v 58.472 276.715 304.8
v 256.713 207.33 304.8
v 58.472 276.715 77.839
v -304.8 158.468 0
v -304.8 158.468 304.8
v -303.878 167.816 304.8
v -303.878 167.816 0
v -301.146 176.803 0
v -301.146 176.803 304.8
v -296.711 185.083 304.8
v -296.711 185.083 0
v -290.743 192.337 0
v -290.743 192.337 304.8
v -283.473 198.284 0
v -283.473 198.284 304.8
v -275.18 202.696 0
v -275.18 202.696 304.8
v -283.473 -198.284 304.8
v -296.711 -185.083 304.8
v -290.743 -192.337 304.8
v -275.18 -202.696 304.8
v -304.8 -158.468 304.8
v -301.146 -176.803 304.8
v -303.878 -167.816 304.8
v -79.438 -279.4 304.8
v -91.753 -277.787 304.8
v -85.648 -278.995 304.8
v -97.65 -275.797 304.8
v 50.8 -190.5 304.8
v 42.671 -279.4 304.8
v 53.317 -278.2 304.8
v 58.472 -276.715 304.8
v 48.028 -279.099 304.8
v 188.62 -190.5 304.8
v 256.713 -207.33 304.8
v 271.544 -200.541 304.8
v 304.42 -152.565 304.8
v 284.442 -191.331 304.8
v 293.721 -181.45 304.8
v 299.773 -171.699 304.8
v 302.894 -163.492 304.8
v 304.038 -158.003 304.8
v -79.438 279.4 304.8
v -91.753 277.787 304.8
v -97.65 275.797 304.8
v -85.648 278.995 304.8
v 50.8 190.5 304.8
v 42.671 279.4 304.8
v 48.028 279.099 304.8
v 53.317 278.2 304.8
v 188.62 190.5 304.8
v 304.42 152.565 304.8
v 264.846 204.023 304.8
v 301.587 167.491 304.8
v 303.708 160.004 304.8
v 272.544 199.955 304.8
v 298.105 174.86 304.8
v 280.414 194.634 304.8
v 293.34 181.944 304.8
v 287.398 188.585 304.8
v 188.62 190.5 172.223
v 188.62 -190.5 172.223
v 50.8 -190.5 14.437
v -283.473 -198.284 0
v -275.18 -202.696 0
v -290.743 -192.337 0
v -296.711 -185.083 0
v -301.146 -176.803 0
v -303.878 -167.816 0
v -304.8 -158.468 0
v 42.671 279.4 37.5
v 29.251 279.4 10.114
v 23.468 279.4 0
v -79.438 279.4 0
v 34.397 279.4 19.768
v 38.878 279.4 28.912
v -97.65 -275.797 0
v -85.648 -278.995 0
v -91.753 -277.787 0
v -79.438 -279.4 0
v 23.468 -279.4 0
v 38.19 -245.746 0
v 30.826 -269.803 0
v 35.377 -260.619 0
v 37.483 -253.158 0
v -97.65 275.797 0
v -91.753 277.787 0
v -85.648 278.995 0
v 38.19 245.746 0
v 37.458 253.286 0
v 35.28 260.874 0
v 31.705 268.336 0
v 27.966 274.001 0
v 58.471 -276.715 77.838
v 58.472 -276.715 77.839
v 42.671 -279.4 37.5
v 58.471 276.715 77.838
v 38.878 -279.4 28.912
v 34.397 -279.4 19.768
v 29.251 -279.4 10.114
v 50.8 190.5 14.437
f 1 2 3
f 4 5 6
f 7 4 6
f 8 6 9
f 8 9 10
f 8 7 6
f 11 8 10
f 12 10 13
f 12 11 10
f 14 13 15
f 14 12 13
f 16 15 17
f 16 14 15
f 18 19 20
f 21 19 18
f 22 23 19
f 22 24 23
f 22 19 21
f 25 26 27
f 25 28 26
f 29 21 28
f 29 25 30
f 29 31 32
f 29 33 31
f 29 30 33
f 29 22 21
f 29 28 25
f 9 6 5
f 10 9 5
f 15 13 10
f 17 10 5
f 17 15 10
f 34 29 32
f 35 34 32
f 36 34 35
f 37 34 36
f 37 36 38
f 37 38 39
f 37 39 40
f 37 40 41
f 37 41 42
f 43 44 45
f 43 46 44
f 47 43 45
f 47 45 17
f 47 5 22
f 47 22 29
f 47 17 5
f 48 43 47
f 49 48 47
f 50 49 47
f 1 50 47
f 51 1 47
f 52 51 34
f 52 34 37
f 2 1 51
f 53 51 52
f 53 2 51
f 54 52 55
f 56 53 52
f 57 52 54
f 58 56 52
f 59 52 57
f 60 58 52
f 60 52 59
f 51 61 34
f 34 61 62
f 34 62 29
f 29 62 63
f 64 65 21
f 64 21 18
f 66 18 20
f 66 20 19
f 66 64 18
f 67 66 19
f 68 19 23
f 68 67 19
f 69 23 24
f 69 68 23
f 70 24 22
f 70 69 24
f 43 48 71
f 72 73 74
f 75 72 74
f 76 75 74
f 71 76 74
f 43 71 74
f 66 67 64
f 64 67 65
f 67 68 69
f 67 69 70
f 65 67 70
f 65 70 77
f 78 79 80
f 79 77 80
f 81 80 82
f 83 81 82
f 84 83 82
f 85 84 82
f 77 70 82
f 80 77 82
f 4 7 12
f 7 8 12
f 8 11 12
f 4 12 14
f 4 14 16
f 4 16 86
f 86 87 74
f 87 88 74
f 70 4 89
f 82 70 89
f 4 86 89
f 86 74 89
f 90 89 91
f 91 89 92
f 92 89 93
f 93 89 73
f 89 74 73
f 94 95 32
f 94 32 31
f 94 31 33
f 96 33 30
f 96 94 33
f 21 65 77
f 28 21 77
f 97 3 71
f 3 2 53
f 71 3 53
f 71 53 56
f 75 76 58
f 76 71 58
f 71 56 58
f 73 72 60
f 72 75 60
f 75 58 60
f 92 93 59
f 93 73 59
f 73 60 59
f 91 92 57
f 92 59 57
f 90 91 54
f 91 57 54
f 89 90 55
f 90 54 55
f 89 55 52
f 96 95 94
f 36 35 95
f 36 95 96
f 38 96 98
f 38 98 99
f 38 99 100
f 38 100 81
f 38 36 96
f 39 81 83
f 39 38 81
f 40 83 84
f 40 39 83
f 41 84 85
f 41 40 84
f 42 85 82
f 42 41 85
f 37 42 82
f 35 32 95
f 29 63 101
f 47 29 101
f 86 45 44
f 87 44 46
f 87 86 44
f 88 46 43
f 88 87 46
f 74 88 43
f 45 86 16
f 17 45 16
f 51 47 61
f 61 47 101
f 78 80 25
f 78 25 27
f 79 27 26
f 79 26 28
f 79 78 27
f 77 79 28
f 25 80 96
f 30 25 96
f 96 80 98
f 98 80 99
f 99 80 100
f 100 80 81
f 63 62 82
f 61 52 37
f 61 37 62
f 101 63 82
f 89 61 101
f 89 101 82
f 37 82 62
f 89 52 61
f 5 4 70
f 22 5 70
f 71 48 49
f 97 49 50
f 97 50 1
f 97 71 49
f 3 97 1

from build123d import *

# Parameters (mm, degrees)
F0_W        = 116.1797607577
F0_H        = 190.5
F1_DEPTH    = 304.8
F3_DEPTH    = 401.32
F4_DEPTH    = 942.34
F5_T1_DEPTH = 331.0069513468
F5_T3_DEPTH = 352.1111565483
F5_T5_DEPTH = 464.9612906349
F5_T7_DEPTH = 766.5905156751
F5_T9_DEPTH = 766.5905156751


# Not quite as in the source:
# - a fillet or chamfer that OpenCascade refuses, or shapes differently, is made with other operations: its cross-section is extruded or revolved along the edge and cut away or added


with BuildPart() as f1:
    # F0 (on Top) → F1 (new body)
    with BuildSketch(Plane.XY):
        Polygon((50.8, 190.5), (50.8, 279.4), (-88.9, 279.4), (-88.9, 190.5), (-88.9, 0), (0, 0), (50.8, 0), align=None)
        Polygon((188.6202392423, 231.1629162652), (50.8, 279.4), (50.8, 190.5), (188.6202392423, 190.5), align=None)
        Polygon((-88.9, 190.5), (-88.9, 279.4), (-304.8, 190.5), (-304.8, 0), (-188.6202392423, 0), (-88.9, 0), align=None)
        Polygon((304.8, 190.5), (188.6202392423, 231.1629162652), (188.6202392423, 190.5), align=None)
        with Locations((246.7101196212, 95.25)):
            Rectangle(F0_W, F0_H)
        Polygon((50.8, -190.5), (50.8, 0), (0, 0), (-88.9, 0), (-88.9, -190.5), (-88.9, -279.4), (50.8, -279.4), align=None)
        Polygon((-88.9, -190.5), (-88.9, 0), (-188.6202392423, 0), (-304.8, 0), (-304.8, -190.5), (-88.9, -279.4), align=None)
        with Locations((246.7101196212, -95.25)):
            Rectangle(F0_W, F0_H)
        Polygon((188.6202392423, -190.5), (50.8, -190.5), (50.8, -279.4), (188.6202392423, -231.1629162652), align=None)
        Polygon((304.8, -190.5), (188.6202392423, -190.5), (188.6202392423, -231.1629162652), align=None)
    extrude(amount=F1_DEPTH)

    # F2 (on Front) → F3 (cut)
    with BuildSketch(Plane.XZ):
        Polygon((306.468307972, 307.1446120739), (38.1901785731, 0), (-147.3951488733, -79.8071026802), (42.6088683307, 0), (5.996810738, -19.8390558362), (306.468307972, -19.8390558362), align=None)
    extrude(amount=-F3_DEPTH, mode=Mode.SUBTRACT)

    # F2 (on Front) → F4 (cut)
    with BuildSketch(Plane.XZ):
        Polygon((306.468307972, 307.1446120739), (38.1901785731, 0), (-147.3951488733, -79.8071026802), (42.6088683307, 0), (5.996810738, -19.8390558362), (306.468307972, -19.8390558362), align=None)
    extrude(amount=F4_DEPTH, mode=Mode.SUBTRACT)

    # F5: fillet of radius 47.8312768991 on 8 edges, made by hand

    # F5_s2 → F5_t1 (cut)
    with BuildSketch(Plane.XY.offset(-5.8851483368)):
        with BuildLine():
            ThreePointArc((42.671278796, 279.4), (50.6850979696, 278.7238898597), (58.4723614349, 276.7146734978))
            Line((58.4723614349, 276.7146734978), (50.8, 279.4))
            Line((50.8, 279.4), (42.671278796, 279.4))
        make_face()
        with BuildLine():
            ThreePointArc((58.4723614349, -276.7146734978), (50.6850979696, -278.7238898597), (42.671278796, -279.4))
            Line((42.671278796, -279.4), (50.8, -279.4))
            Line((50.8, -279.4), (58.4723614349, -276.7146734978))
        make_face()
    extrude(amount=F5_T1_DEPTH, mode=Mode.SUBTRACT)

    # F5_s4 → F5_t3 (cut)
    with BuildSketch(Plane.XY.offset(-23.6555782741)):
        with BuildLine():
            ThreePointArc((-97.6495180547, 275.7972572716), (-88.7201117415, 278.4906706018), (-79.4377686903, 279.4))
            Line((-79.4377686903, 279.4), (-88.9, 279.4))
            Line((-88.9, 279.4), (-97.6495180547, 275.7972572716))
        make_face()
        with BuildLine():
            ThreePointArc((-79.4377686903, -279.4), (-88.7201117415, -278.4906706018), (-97.6495180547, -275.7972572716))
            Line((-97.6495180547, -275.7972572716), (-88.9, -279.4))
            Line((-88.9, -279.4), (-79.4377686903, -279.4))
        make_face()
    extrude(amount=F5_T3_DEPTH, mode=Mode.SUBTRACT)

    # F5_s6 → F5_t5 (cut)
    with BuildSketch(Plane.XY.offset(-80.0806453175)):
        with BuildLine():
            ThreePointArc((-304.8, 158.467741873), (-296.7111580821, 185.0829614206), (-275.1804724653, 202.6962760437))
            Line((-275.1804724653, 202.6962760437), (-304.8, 190.5))
            Line((-304.8, 190.5), (-304.8, 158.467741873))
        make_face()
        with BuildLine():
            ThreePointArc((-275.1804724653, -202.6962760437), (-296.7111580821, -185.0829614206), (-304.8, -158.467741873))
            Line((-304.8, -158.467741873), (-304.8, -190.5))
            Line((-304.8, -190.5), (-275.1804724653, -202.6962760437))
        make_face()
    extrude(amount=F5_T5_DEPTH, mode=Mode.SUBTRACT)

    # F5_s8 → F5_t7 (cut)
    with BuildSketch(Plane(origin=(300.5564502803, -105.1947575981, 344.0992172359), x_dir=(-0.3303504247, -0.9438583564, 0), z_dir=(-0.6410735721, 0.2243757502, -0.7339483619))):
        with BuildLine():
            ThreePointArc((-280.4958263449, 79.454688834), (-270.4603992444, 50.1407879029), (-244.5651615788, 33.1275209877))
            Line((-244.5651615788, 33.1275209877), (-280.4958263449, 42.357459379))
            Line((-280.4958263449, 42.357459379), (-280.4958263449, 79.454688834))
        make_face()
    extrude(amount=F5_T7_DEPTH, mode=Mode.SUBTRACT)

    # F5_s10 → F5_t9 (cut)
    with BuildSketch(Plane(origin=(300.5564502803, 105.1947575981, 344.0992172359), x_dir=(0.3303504247, -0.9438583564, 0), z_dir=(-0.6410735721, -0.2243757502, -0.7339483619))):
        with BuildLine():
            ThreePointArc((280.4958263449, 79.454688834), (270.4603992444, 50.1407879029), (244.5651615788, 33.1275209877))
            Line((244.5651615788, 33.1275209877), (280.4958263449, 42.357459379))
            Line((280.4958263449, 42.357459379), (280.4958263449, 79.454688834))
        make_face()
    extrude(amount=F5_T9_DEPTH, mode=Mode.SUBTRACT)


solid = f1.part
